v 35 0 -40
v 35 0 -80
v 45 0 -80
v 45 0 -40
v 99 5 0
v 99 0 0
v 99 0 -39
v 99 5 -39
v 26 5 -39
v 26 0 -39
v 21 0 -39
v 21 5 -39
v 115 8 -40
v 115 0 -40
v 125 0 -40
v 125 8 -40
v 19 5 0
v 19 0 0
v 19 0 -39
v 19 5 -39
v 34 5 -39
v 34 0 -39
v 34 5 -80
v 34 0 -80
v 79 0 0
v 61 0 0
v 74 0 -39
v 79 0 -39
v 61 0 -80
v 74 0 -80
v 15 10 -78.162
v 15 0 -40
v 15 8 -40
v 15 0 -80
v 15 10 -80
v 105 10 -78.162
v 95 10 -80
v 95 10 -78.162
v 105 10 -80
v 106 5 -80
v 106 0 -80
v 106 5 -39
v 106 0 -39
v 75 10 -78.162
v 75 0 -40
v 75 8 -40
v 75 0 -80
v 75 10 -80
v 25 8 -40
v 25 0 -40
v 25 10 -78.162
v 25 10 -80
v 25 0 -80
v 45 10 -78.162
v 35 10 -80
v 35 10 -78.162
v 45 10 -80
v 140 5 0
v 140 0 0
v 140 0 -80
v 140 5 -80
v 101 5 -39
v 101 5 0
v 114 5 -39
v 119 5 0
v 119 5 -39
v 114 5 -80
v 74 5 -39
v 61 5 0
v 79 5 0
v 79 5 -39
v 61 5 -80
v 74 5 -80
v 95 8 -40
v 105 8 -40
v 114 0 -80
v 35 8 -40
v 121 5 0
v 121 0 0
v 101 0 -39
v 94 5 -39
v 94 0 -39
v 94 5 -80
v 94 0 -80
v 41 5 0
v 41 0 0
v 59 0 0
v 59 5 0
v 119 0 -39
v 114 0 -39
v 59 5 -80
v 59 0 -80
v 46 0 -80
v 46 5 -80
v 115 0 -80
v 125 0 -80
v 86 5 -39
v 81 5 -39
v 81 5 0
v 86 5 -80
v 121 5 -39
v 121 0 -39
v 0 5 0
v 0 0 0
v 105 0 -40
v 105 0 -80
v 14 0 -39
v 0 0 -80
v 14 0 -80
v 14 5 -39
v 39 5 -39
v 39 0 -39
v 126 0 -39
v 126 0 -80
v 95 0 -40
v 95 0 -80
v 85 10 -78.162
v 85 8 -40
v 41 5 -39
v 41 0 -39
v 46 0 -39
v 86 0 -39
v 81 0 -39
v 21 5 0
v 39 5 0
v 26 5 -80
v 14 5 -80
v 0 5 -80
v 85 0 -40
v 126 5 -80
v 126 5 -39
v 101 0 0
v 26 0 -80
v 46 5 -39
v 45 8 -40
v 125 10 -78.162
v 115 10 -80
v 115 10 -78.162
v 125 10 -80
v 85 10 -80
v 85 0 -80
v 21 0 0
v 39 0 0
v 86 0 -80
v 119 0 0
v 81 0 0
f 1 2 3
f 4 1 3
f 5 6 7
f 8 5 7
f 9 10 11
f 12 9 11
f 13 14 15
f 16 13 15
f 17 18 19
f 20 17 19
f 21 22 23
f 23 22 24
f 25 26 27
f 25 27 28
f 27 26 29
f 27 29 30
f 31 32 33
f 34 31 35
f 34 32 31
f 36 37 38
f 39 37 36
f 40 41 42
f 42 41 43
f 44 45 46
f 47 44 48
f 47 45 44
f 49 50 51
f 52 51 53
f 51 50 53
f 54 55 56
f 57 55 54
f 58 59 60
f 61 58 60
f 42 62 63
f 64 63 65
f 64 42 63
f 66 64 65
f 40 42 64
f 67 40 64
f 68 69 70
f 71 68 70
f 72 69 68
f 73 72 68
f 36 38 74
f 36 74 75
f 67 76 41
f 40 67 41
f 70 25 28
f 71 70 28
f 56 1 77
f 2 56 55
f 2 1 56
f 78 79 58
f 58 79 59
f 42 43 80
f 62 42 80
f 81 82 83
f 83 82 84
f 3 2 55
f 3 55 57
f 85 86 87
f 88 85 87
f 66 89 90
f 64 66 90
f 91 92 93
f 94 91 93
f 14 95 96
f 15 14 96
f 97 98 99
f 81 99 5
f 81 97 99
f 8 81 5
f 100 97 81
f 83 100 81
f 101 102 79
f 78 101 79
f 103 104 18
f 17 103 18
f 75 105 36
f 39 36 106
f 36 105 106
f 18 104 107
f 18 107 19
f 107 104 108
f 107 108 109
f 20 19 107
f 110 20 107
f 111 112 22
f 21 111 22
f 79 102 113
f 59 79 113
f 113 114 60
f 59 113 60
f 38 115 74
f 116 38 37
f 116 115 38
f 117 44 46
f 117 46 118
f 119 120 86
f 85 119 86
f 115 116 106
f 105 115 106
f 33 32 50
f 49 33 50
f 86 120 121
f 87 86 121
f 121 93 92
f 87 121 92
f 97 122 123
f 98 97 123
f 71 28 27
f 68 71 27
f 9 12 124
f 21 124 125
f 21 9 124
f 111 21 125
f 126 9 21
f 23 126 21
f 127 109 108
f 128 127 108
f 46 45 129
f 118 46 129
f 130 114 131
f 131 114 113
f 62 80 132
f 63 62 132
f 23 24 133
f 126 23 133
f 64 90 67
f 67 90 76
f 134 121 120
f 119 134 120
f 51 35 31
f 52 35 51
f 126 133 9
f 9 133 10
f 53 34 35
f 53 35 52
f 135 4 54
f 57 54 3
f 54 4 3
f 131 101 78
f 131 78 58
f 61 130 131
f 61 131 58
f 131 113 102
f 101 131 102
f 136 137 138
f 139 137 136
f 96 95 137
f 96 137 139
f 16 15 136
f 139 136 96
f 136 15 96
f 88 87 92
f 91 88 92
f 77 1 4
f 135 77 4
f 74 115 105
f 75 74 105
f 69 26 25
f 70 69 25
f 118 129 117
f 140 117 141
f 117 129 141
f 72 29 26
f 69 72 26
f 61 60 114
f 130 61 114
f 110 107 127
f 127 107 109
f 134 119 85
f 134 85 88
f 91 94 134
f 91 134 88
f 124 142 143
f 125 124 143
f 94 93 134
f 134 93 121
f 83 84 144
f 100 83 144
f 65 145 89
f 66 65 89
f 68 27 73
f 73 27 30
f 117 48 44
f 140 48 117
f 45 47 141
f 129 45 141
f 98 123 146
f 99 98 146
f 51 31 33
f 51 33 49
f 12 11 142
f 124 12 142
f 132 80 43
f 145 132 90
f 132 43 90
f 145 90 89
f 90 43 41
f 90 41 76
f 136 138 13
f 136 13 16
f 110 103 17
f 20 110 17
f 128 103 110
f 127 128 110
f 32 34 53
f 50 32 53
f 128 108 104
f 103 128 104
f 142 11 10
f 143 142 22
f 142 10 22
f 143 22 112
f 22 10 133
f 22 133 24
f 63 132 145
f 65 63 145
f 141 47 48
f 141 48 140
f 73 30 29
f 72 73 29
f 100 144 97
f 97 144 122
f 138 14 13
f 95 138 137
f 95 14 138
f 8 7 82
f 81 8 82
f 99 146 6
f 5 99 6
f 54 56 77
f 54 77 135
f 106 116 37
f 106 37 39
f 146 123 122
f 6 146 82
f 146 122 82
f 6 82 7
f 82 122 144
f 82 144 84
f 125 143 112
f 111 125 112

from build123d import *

# Parameters (mm, degrees)
SKETCH1_W             = 10
SKETCH1_H             = 40
BOSS_EXTRUDE1_DEPTH   = 10
BOSS_EXTRUDE1_2_DEPTH = 10
BOSS_EXTRUDE1_3_DEPTH = 10
BOSS_EXTRUDE1_4_DEPTH = 10
BOSS_EXTRUDE1_5_DEPTH = 10
BOSS_EXTRUDE2_DEPTH   = 5
BOSS_EXTRUDE2_2_DEPTH = 5
BOSS_EXTRUDE2_3_DEPTH = 5
BOSS_EXTRUDE2_4_DEPTH = 5
BOSS_EXTRUDE2_5_DEPTH = 5
BOSS_EXTRUDE2_6_DEPTH = 5
BOSS_EXTRUDE2_7_DEPTH = 5
CHAMFER1_SIZE         = 2
CHAMFER1_SIZE2        = 38.162273375
CHAMFER2_SIZE         = 2
CHAMFER2_SIZE2        = 38.162273375
CHAMFER3_SIZE         = 2
CHAMFER3_SIZE2        = 38.162273375
CHAMFER4_SIZE         = 2
CHAMFER4_SIZE2        = 38.162273375
CHAMFER5_SIZE         = 2
CHAMFER5_SIZE2        = 38.162273375


with BuildPart() as part:
    # Sketch1 → Boss-Extrude1 (new body)
    with BuildSketch(Plane(origin=(0, 0, 0), x_dir=(1, 0, 0), z_dir=(0, 1, 0))):
        with Locations((20, 60)):
            Rectangle(SKETCH1_W, SKETCH1_H)
    extrude(amount=BOSS_EXTRUDE1_DEPTH)

    # Chamfer1
    chamfer1_edges = [part.edges().sort_by_distance(p)[0] for p in [
        (20, 10, -40),
    ]]
    chamfer1_side = [part.faces().sort_by_distance(p)[0] for p in [
        (20, 5, -40),
    ]]
    chamfer(chamfer1_edges, length=CHAMFER1_SIZE, length2=CHAMFER1_SIZE2, reference=chamfer1_side[0])


with BuildPart() as body_2:
    # Sketch1 → Boss-Extrude1 2 (new body)
    with BuildSketch(Plane(origin=(0, 0, 0), x_dir=(1, 0, 0), z_dir=(0, 1, 0))):
        with Locations((40, 60)):
            Rectangle(SKETCH1_W, SKETCH1_H)
    extrude(amount=BOSS_EXTRUDE1_2_DEPTH)

    # Chamfer2
    chamfer2_edges = [body_2.edges().sort_by_distance(p)[0] for p in [
        (40, 10, -40),
    ]]
    chamfer2_side = [body_2.faces().sort_by_distance(p)[0] for p in [
        (40, 5, -40),
    ]]
    chamfer(chamfer2_edges, length=CHAMFER2_SIZE, length2=CHAMFER2_SIZE2, reference=chamfer2_side[0])


with BuildPart() as body_3:
    # Sketch1 → Boss-Extrude1 3 (new body)
    with BuildSketch(Plane(origin=(0, 0, 0), x_dir=(1, 0, 0), z_dir=(0, 1, 0))):
        with Locations((80, 60)):
            Rectangle(SKETCH1_W, SKETCH1_H)
    extrude(amount=BOSS_EXTRUDE1_3_DEPTH)

    # Chamfer3
    chamfer3_edges = [body_3.edges().sort_by_distance(p)[0] for p in [
        (80, 10, -40),
    ]]
    chamfer3_side = [body_3.faces().sort_by_distance(p)[0] for p in [
        (80, 5, -40),
    ]]
    chamfer(chamfer3_edges, length=CHAMFER3_SIZE, length2=CHAMFER3_SIZE2, reference=chamfer3_side[0])


with BuildPart() as body_4:
    # Sketch1 → Boss-Extrude1 4 (new body)
    with BuildSketch(Plane(origin=(0, 0, 0), x_dir=(1, 0, 0), z_dir=(0, 1, 0))):
        with Locations((100, 60)):
            Rectangle(SKETCH1_W, SKETCH1_H)
    extrude(amount=BOSS_EXTRUDE1_4_DEPTH)

    # Chamfer4
    chamfer4_edges = [body_4.edges().sort_by_distance(p)[0] for p in [
        (100, 10, -40),
    ]]
    chamfer4_side = [body_4.faces().sort_by_distance(p)[0] for p in [
        (100, 5, -40),
    ]]
    chamfer(chamfer4_edges, length=CHAMFER4_SIZE, length2=CHAMFER4_SIZE2, reference=chamfer4_side[0])


with BuildPart() as body_5:
    # Sketch1 → Boss-Extrude1 5 (new body)
    with BuildSketch(Plane(origin=(0, 0, 0), x_dir=(1, 0, 0), z_dir=(0, 1, 0))):
        with Locations((120, 60)):
            Rectangle(SKETCH1_W, SKETCH1_H)
    extrude(amount=BOSS_EXTRUDE1_5_DEPTH)

    # Chamfer5
    chamfer5_edges = [body_5.edges().sort_by_distance(p)[0] for p in [
        (120, 10, -40),
    ]]
    chamfer5_side = [body_5.faces().sort_by_distance(p)[0] for p in [
        (120, 5, -40),
    ]]
    chamfer(chamfer5_edges, length=CHAMFER5_SIZE, length2=CHAMFER5_SIZE2, reference=chamfer5_side[0])


with BuildPart() as body_6:
    # Sketch1<3> → Boss-Extrude2 (new body)
    with BuildSketch(Plane(origin=(0, 0, 0), x_dir=(1, 0, 0), z_dir=(0, 1, 0))):
        Polygon((0, 80), (0, 0), (19, 0), (19, 39), (14, 39), (14, 80), align=None)
    extrude(amount=BOSS_EXTRUDE2_DEPTH)


with BuildPart() as body_7:
    # Sketch1<3> → Boss-Extrude2 2 (new body)
    with BuildSketch(Plane(origin=(0, 0, 0), x_dir=(1, 0, 0), z_dir=(0, 1, 0))):
        Polygon((21, 39), (21, 0), (39, 0), (39, 39), (34, 39), (34, 80), (26, 80), (26, 39), align=None)
    extrude(amount=BOSS_EXTRUDE2_2_DEPTH)


with BuildPart() as body_8:
    # Sketch1<3> → Boss-Extrude2 3 (new body)
    with BuildSketch(Plane(origin=(0, 0, 0), x_dir=(1, 0, 0), z_dir=(0, 1, 0))):
        Polygon((41, 39), (41, 0), (59, 0), (59, 80), (46, 80), (46, 39), align=None)
    extrude(amount=BOSS_EXTRUDE2_3_DEPTH)


with BuildPart() as body_9:
    # Sketch1<3> → Boss-Extrude2 4 (new body)
    with BuildSketch(Plane(origin=(0, 0, 0), x_dir=(1, 0, 0), z_dir=(0, 1, 0))):
        Polygon((61, 80), (61, 0), (79, 0), (79, 39), (74, 39), (74, 80), align=None)
    extrude(amount=BOSS_EXTRUDE2_4_DEPTH)


with BuildPart() as body_10:
    # Sketch1<3> → Boss-Extrude2 5 (new body)
    with BuildSketch(Plane(origin=(0, 0, 0), x_dir=(1, 0, 0), z_dir=(0, 1, 0))):
        Polygon((81, 39), (81, 0), (99, 0), (99, 39), (94, 39), (94, 80), (86, 80), (86, 39), align=None)
    extrude(amount=BOSS_EXTRUDE2_5_DEPTH)


with BuildPart() as body_11:
    # Sketch1<3> → Boss-Extrude2 6 (new body)
    with BuildSketch(Plane(origin=(0, 0, 0), x_dir=(1, 0, 0), z_dir=(0, 1, 0))):
        Polygon((101, 39), (101, 0), (119, 0), (119, 39), (114, 39), (114, 80), (106, 80), (106, 39), align=None)
    extrude(amount=BOSS_EXTRUDE2_6_DEPTH)


with BuildPart() as body_12:
    # Sketch1<3> → Boss-Extrude2 7 (new body)
    with BuildSketch(Plane(origin=(0, 0, 0), x_dir=(1, 0, 0), z_dir=(0, 1, 0))):
        Polygon((121, 39), (121, 0), (140, 0), (140, 80), (126, 80), (126, 39), align=None)
    extrude(amount=BOSS_EXTRUDE2_7_DEPTH)


solid = Compound([part.part, body_2.part, body_3.part, body_4.part, body_5.part, body_6.part, body_7.part, body_8.part, body_9.part, body_10.part, body_11.part, body_12.part])
